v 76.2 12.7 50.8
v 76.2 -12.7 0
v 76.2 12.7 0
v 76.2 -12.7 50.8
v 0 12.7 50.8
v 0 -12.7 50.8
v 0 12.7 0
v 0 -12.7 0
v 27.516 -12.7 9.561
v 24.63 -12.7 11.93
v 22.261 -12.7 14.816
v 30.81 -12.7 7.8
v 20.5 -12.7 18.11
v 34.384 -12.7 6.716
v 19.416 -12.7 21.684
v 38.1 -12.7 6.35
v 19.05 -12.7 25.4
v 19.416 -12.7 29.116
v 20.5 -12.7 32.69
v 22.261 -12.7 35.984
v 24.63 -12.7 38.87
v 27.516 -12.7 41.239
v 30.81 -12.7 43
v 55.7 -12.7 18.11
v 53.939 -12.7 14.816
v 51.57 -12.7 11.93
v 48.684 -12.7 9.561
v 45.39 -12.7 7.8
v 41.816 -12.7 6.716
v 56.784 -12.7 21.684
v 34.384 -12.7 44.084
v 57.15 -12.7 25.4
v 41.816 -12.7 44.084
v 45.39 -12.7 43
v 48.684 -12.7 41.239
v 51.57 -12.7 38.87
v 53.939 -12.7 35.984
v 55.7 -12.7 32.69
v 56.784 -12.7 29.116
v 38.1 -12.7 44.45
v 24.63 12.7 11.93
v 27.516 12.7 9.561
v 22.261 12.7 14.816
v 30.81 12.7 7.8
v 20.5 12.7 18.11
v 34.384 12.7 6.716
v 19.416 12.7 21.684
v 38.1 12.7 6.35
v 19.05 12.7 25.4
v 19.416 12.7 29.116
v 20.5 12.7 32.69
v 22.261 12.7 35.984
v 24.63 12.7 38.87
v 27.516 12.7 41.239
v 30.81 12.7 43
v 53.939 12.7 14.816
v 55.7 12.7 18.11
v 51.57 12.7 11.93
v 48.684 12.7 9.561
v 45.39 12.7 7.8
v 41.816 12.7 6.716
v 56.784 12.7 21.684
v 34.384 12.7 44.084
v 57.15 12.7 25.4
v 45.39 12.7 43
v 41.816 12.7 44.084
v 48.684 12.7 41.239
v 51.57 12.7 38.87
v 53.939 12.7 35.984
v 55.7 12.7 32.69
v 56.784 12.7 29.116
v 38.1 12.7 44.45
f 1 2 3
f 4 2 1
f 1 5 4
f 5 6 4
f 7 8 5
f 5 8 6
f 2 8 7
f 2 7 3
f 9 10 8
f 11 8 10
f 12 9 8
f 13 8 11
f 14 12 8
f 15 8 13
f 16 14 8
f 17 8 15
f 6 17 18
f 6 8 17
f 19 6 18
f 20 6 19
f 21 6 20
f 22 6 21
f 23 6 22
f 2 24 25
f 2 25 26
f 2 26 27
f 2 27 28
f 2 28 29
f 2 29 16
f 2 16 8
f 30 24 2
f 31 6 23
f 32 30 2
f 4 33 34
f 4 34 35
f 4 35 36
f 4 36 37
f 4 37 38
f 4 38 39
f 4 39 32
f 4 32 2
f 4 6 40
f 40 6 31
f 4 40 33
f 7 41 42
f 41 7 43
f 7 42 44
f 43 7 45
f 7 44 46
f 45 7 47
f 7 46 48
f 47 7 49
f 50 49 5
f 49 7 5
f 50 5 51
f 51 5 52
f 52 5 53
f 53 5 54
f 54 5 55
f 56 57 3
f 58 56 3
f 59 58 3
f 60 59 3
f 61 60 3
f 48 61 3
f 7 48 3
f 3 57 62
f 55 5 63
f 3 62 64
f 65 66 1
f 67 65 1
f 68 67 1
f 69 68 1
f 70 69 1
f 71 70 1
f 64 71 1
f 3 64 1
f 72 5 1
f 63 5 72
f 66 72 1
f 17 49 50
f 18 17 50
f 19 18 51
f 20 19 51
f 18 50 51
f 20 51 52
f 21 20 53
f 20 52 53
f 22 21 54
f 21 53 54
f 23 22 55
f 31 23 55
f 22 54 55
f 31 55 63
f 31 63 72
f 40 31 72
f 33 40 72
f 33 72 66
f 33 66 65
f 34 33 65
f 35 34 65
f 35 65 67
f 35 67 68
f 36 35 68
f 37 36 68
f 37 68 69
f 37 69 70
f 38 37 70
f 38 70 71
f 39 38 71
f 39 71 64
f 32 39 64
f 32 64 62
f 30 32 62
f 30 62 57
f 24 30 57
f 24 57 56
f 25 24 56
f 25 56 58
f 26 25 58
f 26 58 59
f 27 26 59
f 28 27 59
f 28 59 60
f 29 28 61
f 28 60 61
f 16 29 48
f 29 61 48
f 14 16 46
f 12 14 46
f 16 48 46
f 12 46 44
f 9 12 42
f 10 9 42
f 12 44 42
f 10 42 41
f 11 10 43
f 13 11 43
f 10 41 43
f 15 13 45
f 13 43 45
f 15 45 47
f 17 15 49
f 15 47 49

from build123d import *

# Parameters (mm, degrees)
F0_W     = 76.2
F0_H     = 50.8
F1_DEPTH = 12.7
F3_D     = 38.1


with BuildPart() as f1:
    # F0 (on Front) → F1 (new body, symmetric)
    with BuildSketch(Plane.XZ):
        with Locations((38.1, 25.4)):
            Rectangle(F0_W, F0_H)
    extrude(amount=F1_DEPTH, both=True)

    # F3 (through all)
    with Locations(Plane.XZ.offset(12.7)):
        with Locations((38.1, 25.4)):
            Hole(F3_D / 2)


solid = f1.part
